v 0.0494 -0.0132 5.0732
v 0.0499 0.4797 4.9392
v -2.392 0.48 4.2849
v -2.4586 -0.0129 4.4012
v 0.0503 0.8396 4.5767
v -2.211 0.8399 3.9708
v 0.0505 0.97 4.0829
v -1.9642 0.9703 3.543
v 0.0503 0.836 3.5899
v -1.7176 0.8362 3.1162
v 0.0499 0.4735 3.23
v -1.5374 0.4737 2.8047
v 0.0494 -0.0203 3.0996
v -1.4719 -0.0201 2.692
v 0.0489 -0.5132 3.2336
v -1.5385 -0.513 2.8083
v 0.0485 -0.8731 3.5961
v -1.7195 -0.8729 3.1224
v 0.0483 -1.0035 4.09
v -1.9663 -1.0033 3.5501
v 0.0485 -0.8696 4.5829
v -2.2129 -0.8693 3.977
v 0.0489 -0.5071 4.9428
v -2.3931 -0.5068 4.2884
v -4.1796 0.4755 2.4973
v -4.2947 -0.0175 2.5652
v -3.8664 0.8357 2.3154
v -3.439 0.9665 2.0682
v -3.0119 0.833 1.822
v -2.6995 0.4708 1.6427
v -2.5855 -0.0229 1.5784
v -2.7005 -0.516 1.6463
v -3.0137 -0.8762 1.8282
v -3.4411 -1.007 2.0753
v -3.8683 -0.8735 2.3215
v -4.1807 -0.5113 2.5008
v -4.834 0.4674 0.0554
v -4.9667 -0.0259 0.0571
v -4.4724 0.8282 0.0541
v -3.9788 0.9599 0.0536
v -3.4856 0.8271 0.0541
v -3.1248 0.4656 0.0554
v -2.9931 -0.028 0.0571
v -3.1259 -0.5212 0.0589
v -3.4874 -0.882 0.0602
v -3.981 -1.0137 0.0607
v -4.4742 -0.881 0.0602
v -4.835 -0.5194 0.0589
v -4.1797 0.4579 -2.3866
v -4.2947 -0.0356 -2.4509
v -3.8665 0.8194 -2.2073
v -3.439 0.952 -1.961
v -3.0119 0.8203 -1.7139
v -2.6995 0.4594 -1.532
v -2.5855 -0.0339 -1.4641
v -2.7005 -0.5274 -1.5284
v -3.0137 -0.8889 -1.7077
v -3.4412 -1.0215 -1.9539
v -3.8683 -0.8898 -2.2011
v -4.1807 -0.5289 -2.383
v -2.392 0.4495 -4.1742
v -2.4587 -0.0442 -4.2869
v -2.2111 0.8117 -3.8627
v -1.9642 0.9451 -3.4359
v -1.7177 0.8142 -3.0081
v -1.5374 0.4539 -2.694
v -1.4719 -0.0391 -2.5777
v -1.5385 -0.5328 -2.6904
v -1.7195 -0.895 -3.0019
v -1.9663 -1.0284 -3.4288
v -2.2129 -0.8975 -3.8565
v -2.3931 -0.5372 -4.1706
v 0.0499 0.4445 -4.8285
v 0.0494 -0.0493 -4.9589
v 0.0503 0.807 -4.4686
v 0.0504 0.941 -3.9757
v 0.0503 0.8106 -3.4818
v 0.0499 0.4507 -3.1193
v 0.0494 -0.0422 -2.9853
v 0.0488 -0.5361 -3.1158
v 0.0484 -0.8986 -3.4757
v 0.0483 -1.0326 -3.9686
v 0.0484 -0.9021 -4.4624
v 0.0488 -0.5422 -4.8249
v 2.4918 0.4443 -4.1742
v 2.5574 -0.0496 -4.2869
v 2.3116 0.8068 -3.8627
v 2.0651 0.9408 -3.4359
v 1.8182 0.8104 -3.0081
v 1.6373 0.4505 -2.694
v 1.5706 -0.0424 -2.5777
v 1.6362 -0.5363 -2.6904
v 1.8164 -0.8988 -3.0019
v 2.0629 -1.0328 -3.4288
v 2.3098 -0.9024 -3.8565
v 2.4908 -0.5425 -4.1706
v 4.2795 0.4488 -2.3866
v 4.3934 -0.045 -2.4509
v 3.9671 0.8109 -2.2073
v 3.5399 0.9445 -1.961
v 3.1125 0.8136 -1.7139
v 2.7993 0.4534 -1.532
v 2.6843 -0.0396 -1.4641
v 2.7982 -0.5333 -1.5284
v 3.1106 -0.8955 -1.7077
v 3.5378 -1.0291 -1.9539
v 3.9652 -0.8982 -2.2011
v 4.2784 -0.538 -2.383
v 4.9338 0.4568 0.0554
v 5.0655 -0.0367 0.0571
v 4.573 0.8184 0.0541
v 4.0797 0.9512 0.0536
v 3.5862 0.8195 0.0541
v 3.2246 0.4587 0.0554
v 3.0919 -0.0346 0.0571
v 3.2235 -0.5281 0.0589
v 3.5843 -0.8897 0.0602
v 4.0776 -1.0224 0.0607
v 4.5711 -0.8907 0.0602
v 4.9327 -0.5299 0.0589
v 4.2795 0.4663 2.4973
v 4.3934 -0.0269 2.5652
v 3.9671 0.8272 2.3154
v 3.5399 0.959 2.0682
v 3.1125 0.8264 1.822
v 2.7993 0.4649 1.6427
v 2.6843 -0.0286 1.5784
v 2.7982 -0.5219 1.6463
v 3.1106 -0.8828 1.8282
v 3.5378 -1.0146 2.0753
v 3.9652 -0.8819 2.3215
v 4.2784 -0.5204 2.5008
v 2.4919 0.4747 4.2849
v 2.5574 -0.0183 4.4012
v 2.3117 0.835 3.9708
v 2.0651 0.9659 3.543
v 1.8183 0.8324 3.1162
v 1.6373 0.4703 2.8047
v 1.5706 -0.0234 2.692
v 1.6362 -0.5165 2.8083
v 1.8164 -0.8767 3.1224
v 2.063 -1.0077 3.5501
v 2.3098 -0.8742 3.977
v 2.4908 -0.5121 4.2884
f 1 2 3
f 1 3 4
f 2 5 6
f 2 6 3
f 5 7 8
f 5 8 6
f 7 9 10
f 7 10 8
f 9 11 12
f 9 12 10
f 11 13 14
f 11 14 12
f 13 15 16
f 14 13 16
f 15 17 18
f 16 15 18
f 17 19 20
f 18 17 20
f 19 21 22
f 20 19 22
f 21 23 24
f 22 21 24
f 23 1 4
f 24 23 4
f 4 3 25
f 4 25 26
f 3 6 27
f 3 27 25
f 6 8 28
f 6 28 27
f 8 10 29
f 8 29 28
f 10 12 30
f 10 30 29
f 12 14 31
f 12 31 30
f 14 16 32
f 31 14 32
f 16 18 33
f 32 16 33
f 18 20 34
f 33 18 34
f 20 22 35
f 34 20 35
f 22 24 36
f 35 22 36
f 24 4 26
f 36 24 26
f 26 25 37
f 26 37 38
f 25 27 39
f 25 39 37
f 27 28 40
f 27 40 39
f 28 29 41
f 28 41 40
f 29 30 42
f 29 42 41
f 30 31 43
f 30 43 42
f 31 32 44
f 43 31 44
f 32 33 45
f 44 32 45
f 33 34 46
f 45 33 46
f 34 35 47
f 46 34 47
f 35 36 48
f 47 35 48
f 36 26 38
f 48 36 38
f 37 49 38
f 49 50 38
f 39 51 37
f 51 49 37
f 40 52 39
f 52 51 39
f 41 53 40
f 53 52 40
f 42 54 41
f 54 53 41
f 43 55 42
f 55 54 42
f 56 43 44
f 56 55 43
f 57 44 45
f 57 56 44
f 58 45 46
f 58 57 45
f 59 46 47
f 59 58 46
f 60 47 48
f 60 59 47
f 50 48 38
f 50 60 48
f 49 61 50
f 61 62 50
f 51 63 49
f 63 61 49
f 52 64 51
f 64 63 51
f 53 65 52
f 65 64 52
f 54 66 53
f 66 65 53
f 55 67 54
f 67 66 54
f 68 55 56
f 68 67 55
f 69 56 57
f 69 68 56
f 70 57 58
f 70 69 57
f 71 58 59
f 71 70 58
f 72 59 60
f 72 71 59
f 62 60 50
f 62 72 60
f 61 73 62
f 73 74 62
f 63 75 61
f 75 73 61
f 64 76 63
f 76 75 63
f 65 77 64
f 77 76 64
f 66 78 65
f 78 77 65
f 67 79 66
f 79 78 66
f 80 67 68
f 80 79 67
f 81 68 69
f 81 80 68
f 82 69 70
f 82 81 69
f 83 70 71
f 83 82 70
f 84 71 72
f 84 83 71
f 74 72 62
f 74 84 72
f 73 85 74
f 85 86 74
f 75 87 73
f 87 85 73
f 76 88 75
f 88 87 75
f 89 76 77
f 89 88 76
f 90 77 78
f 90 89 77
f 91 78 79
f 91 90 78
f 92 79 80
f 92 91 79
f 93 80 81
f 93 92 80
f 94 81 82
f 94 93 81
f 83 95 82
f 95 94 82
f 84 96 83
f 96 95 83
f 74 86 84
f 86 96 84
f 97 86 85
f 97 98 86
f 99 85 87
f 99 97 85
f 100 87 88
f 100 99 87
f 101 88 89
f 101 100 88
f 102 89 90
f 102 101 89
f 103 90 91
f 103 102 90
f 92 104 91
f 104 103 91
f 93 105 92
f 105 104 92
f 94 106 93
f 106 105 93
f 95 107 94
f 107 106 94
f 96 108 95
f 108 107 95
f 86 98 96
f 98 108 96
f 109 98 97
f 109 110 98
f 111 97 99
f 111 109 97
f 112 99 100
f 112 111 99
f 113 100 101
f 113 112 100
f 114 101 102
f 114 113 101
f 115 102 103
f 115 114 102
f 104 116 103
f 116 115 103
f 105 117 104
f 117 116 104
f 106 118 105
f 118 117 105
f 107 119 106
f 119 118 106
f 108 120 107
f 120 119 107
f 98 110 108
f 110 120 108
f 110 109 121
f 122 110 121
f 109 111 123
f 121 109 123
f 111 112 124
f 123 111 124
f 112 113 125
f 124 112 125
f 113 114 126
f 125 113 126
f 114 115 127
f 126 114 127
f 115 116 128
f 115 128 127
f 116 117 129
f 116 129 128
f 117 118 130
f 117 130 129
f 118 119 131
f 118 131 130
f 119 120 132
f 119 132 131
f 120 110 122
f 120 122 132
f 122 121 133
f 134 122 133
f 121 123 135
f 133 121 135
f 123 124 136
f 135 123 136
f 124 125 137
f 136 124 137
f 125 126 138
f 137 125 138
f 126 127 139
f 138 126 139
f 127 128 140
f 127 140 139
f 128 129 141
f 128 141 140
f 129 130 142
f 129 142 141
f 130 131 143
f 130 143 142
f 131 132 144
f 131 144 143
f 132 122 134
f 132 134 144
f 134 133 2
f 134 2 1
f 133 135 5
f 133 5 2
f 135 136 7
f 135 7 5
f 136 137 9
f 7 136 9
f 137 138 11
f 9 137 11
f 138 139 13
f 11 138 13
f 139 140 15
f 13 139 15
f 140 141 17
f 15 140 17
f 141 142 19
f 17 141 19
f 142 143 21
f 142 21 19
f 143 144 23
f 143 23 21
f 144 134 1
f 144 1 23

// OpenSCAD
intersection() {
translate([-6.000000, -1.200000, -6.000000])
cube(size = [12.000000, 2.400000, 12.000000], center = false);
union() {
// Begin.
union() {
translate([0.04938, -0.03127, 0.05714])
rotate([0, 0.206265, 89.9381])
rotate([0, 90, 0])
rotate_extrude($fn = 12)
translate([4.02929, 0, 0])
circle(r = 0.98679, $fn = 12);

translate([0.04938, -0.03127, 0.05714])
rotate([0, 0.206265, 89.9381])
rotate([0, 90, 0])
rotate_extrude($fn = 12)
translate([4.02929, 0, 0])
circle(r = 0.98679, $fn = 12);
}
// End.
}
}
